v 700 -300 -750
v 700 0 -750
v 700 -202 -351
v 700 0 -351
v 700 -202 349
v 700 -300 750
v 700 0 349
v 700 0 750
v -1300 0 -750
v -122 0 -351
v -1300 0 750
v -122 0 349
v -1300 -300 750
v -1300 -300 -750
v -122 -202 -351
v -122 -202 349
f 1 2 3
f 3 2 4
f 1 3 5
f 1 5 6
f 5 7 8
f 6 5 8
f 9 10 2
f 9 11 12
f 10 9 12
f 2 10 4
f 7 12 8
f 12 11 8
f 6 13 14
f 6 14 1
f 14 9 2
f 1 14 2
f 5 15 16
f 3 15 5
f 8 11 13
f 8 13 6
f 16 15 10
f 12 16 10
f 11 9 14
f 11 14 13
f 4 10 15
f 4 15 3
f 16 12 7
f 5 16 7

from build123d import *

# Parameters (mm, degrees)
BOX003_W     = 1000
BOX003_H     = 800
BOX003_DEPTH = 700
SKETCH_W     = 2000
SKETCH_H     = 1500
PAD_DEPTH    = 300


with BuildPart() as cube003:
    # Box003 → Box003 (new body)
    with BuildSketch(Plane(origin=(-122, -202, -351), x_dir=(1, 0, 0), z_dir=(0, 0, 1))):
        with Locations((500, 400)):
            Rectangle(BOX003_W, BOX003_H)
    extrude(amount=BOX003_DEPTH)


with BuildPart() as cut:
    # Sketch → Pad (new body)
    with BuildSketch(Plane.XZ):
        with Locations((-300, 0)):
            Rectangle(SKETCH_W, SKETCH_H)
    extrude(amount=PAD_DEPTH)

    # Cut: cut Cube003
    add(cube003.part, mode=Mode.SUBTRACT)


solid = cut.part
